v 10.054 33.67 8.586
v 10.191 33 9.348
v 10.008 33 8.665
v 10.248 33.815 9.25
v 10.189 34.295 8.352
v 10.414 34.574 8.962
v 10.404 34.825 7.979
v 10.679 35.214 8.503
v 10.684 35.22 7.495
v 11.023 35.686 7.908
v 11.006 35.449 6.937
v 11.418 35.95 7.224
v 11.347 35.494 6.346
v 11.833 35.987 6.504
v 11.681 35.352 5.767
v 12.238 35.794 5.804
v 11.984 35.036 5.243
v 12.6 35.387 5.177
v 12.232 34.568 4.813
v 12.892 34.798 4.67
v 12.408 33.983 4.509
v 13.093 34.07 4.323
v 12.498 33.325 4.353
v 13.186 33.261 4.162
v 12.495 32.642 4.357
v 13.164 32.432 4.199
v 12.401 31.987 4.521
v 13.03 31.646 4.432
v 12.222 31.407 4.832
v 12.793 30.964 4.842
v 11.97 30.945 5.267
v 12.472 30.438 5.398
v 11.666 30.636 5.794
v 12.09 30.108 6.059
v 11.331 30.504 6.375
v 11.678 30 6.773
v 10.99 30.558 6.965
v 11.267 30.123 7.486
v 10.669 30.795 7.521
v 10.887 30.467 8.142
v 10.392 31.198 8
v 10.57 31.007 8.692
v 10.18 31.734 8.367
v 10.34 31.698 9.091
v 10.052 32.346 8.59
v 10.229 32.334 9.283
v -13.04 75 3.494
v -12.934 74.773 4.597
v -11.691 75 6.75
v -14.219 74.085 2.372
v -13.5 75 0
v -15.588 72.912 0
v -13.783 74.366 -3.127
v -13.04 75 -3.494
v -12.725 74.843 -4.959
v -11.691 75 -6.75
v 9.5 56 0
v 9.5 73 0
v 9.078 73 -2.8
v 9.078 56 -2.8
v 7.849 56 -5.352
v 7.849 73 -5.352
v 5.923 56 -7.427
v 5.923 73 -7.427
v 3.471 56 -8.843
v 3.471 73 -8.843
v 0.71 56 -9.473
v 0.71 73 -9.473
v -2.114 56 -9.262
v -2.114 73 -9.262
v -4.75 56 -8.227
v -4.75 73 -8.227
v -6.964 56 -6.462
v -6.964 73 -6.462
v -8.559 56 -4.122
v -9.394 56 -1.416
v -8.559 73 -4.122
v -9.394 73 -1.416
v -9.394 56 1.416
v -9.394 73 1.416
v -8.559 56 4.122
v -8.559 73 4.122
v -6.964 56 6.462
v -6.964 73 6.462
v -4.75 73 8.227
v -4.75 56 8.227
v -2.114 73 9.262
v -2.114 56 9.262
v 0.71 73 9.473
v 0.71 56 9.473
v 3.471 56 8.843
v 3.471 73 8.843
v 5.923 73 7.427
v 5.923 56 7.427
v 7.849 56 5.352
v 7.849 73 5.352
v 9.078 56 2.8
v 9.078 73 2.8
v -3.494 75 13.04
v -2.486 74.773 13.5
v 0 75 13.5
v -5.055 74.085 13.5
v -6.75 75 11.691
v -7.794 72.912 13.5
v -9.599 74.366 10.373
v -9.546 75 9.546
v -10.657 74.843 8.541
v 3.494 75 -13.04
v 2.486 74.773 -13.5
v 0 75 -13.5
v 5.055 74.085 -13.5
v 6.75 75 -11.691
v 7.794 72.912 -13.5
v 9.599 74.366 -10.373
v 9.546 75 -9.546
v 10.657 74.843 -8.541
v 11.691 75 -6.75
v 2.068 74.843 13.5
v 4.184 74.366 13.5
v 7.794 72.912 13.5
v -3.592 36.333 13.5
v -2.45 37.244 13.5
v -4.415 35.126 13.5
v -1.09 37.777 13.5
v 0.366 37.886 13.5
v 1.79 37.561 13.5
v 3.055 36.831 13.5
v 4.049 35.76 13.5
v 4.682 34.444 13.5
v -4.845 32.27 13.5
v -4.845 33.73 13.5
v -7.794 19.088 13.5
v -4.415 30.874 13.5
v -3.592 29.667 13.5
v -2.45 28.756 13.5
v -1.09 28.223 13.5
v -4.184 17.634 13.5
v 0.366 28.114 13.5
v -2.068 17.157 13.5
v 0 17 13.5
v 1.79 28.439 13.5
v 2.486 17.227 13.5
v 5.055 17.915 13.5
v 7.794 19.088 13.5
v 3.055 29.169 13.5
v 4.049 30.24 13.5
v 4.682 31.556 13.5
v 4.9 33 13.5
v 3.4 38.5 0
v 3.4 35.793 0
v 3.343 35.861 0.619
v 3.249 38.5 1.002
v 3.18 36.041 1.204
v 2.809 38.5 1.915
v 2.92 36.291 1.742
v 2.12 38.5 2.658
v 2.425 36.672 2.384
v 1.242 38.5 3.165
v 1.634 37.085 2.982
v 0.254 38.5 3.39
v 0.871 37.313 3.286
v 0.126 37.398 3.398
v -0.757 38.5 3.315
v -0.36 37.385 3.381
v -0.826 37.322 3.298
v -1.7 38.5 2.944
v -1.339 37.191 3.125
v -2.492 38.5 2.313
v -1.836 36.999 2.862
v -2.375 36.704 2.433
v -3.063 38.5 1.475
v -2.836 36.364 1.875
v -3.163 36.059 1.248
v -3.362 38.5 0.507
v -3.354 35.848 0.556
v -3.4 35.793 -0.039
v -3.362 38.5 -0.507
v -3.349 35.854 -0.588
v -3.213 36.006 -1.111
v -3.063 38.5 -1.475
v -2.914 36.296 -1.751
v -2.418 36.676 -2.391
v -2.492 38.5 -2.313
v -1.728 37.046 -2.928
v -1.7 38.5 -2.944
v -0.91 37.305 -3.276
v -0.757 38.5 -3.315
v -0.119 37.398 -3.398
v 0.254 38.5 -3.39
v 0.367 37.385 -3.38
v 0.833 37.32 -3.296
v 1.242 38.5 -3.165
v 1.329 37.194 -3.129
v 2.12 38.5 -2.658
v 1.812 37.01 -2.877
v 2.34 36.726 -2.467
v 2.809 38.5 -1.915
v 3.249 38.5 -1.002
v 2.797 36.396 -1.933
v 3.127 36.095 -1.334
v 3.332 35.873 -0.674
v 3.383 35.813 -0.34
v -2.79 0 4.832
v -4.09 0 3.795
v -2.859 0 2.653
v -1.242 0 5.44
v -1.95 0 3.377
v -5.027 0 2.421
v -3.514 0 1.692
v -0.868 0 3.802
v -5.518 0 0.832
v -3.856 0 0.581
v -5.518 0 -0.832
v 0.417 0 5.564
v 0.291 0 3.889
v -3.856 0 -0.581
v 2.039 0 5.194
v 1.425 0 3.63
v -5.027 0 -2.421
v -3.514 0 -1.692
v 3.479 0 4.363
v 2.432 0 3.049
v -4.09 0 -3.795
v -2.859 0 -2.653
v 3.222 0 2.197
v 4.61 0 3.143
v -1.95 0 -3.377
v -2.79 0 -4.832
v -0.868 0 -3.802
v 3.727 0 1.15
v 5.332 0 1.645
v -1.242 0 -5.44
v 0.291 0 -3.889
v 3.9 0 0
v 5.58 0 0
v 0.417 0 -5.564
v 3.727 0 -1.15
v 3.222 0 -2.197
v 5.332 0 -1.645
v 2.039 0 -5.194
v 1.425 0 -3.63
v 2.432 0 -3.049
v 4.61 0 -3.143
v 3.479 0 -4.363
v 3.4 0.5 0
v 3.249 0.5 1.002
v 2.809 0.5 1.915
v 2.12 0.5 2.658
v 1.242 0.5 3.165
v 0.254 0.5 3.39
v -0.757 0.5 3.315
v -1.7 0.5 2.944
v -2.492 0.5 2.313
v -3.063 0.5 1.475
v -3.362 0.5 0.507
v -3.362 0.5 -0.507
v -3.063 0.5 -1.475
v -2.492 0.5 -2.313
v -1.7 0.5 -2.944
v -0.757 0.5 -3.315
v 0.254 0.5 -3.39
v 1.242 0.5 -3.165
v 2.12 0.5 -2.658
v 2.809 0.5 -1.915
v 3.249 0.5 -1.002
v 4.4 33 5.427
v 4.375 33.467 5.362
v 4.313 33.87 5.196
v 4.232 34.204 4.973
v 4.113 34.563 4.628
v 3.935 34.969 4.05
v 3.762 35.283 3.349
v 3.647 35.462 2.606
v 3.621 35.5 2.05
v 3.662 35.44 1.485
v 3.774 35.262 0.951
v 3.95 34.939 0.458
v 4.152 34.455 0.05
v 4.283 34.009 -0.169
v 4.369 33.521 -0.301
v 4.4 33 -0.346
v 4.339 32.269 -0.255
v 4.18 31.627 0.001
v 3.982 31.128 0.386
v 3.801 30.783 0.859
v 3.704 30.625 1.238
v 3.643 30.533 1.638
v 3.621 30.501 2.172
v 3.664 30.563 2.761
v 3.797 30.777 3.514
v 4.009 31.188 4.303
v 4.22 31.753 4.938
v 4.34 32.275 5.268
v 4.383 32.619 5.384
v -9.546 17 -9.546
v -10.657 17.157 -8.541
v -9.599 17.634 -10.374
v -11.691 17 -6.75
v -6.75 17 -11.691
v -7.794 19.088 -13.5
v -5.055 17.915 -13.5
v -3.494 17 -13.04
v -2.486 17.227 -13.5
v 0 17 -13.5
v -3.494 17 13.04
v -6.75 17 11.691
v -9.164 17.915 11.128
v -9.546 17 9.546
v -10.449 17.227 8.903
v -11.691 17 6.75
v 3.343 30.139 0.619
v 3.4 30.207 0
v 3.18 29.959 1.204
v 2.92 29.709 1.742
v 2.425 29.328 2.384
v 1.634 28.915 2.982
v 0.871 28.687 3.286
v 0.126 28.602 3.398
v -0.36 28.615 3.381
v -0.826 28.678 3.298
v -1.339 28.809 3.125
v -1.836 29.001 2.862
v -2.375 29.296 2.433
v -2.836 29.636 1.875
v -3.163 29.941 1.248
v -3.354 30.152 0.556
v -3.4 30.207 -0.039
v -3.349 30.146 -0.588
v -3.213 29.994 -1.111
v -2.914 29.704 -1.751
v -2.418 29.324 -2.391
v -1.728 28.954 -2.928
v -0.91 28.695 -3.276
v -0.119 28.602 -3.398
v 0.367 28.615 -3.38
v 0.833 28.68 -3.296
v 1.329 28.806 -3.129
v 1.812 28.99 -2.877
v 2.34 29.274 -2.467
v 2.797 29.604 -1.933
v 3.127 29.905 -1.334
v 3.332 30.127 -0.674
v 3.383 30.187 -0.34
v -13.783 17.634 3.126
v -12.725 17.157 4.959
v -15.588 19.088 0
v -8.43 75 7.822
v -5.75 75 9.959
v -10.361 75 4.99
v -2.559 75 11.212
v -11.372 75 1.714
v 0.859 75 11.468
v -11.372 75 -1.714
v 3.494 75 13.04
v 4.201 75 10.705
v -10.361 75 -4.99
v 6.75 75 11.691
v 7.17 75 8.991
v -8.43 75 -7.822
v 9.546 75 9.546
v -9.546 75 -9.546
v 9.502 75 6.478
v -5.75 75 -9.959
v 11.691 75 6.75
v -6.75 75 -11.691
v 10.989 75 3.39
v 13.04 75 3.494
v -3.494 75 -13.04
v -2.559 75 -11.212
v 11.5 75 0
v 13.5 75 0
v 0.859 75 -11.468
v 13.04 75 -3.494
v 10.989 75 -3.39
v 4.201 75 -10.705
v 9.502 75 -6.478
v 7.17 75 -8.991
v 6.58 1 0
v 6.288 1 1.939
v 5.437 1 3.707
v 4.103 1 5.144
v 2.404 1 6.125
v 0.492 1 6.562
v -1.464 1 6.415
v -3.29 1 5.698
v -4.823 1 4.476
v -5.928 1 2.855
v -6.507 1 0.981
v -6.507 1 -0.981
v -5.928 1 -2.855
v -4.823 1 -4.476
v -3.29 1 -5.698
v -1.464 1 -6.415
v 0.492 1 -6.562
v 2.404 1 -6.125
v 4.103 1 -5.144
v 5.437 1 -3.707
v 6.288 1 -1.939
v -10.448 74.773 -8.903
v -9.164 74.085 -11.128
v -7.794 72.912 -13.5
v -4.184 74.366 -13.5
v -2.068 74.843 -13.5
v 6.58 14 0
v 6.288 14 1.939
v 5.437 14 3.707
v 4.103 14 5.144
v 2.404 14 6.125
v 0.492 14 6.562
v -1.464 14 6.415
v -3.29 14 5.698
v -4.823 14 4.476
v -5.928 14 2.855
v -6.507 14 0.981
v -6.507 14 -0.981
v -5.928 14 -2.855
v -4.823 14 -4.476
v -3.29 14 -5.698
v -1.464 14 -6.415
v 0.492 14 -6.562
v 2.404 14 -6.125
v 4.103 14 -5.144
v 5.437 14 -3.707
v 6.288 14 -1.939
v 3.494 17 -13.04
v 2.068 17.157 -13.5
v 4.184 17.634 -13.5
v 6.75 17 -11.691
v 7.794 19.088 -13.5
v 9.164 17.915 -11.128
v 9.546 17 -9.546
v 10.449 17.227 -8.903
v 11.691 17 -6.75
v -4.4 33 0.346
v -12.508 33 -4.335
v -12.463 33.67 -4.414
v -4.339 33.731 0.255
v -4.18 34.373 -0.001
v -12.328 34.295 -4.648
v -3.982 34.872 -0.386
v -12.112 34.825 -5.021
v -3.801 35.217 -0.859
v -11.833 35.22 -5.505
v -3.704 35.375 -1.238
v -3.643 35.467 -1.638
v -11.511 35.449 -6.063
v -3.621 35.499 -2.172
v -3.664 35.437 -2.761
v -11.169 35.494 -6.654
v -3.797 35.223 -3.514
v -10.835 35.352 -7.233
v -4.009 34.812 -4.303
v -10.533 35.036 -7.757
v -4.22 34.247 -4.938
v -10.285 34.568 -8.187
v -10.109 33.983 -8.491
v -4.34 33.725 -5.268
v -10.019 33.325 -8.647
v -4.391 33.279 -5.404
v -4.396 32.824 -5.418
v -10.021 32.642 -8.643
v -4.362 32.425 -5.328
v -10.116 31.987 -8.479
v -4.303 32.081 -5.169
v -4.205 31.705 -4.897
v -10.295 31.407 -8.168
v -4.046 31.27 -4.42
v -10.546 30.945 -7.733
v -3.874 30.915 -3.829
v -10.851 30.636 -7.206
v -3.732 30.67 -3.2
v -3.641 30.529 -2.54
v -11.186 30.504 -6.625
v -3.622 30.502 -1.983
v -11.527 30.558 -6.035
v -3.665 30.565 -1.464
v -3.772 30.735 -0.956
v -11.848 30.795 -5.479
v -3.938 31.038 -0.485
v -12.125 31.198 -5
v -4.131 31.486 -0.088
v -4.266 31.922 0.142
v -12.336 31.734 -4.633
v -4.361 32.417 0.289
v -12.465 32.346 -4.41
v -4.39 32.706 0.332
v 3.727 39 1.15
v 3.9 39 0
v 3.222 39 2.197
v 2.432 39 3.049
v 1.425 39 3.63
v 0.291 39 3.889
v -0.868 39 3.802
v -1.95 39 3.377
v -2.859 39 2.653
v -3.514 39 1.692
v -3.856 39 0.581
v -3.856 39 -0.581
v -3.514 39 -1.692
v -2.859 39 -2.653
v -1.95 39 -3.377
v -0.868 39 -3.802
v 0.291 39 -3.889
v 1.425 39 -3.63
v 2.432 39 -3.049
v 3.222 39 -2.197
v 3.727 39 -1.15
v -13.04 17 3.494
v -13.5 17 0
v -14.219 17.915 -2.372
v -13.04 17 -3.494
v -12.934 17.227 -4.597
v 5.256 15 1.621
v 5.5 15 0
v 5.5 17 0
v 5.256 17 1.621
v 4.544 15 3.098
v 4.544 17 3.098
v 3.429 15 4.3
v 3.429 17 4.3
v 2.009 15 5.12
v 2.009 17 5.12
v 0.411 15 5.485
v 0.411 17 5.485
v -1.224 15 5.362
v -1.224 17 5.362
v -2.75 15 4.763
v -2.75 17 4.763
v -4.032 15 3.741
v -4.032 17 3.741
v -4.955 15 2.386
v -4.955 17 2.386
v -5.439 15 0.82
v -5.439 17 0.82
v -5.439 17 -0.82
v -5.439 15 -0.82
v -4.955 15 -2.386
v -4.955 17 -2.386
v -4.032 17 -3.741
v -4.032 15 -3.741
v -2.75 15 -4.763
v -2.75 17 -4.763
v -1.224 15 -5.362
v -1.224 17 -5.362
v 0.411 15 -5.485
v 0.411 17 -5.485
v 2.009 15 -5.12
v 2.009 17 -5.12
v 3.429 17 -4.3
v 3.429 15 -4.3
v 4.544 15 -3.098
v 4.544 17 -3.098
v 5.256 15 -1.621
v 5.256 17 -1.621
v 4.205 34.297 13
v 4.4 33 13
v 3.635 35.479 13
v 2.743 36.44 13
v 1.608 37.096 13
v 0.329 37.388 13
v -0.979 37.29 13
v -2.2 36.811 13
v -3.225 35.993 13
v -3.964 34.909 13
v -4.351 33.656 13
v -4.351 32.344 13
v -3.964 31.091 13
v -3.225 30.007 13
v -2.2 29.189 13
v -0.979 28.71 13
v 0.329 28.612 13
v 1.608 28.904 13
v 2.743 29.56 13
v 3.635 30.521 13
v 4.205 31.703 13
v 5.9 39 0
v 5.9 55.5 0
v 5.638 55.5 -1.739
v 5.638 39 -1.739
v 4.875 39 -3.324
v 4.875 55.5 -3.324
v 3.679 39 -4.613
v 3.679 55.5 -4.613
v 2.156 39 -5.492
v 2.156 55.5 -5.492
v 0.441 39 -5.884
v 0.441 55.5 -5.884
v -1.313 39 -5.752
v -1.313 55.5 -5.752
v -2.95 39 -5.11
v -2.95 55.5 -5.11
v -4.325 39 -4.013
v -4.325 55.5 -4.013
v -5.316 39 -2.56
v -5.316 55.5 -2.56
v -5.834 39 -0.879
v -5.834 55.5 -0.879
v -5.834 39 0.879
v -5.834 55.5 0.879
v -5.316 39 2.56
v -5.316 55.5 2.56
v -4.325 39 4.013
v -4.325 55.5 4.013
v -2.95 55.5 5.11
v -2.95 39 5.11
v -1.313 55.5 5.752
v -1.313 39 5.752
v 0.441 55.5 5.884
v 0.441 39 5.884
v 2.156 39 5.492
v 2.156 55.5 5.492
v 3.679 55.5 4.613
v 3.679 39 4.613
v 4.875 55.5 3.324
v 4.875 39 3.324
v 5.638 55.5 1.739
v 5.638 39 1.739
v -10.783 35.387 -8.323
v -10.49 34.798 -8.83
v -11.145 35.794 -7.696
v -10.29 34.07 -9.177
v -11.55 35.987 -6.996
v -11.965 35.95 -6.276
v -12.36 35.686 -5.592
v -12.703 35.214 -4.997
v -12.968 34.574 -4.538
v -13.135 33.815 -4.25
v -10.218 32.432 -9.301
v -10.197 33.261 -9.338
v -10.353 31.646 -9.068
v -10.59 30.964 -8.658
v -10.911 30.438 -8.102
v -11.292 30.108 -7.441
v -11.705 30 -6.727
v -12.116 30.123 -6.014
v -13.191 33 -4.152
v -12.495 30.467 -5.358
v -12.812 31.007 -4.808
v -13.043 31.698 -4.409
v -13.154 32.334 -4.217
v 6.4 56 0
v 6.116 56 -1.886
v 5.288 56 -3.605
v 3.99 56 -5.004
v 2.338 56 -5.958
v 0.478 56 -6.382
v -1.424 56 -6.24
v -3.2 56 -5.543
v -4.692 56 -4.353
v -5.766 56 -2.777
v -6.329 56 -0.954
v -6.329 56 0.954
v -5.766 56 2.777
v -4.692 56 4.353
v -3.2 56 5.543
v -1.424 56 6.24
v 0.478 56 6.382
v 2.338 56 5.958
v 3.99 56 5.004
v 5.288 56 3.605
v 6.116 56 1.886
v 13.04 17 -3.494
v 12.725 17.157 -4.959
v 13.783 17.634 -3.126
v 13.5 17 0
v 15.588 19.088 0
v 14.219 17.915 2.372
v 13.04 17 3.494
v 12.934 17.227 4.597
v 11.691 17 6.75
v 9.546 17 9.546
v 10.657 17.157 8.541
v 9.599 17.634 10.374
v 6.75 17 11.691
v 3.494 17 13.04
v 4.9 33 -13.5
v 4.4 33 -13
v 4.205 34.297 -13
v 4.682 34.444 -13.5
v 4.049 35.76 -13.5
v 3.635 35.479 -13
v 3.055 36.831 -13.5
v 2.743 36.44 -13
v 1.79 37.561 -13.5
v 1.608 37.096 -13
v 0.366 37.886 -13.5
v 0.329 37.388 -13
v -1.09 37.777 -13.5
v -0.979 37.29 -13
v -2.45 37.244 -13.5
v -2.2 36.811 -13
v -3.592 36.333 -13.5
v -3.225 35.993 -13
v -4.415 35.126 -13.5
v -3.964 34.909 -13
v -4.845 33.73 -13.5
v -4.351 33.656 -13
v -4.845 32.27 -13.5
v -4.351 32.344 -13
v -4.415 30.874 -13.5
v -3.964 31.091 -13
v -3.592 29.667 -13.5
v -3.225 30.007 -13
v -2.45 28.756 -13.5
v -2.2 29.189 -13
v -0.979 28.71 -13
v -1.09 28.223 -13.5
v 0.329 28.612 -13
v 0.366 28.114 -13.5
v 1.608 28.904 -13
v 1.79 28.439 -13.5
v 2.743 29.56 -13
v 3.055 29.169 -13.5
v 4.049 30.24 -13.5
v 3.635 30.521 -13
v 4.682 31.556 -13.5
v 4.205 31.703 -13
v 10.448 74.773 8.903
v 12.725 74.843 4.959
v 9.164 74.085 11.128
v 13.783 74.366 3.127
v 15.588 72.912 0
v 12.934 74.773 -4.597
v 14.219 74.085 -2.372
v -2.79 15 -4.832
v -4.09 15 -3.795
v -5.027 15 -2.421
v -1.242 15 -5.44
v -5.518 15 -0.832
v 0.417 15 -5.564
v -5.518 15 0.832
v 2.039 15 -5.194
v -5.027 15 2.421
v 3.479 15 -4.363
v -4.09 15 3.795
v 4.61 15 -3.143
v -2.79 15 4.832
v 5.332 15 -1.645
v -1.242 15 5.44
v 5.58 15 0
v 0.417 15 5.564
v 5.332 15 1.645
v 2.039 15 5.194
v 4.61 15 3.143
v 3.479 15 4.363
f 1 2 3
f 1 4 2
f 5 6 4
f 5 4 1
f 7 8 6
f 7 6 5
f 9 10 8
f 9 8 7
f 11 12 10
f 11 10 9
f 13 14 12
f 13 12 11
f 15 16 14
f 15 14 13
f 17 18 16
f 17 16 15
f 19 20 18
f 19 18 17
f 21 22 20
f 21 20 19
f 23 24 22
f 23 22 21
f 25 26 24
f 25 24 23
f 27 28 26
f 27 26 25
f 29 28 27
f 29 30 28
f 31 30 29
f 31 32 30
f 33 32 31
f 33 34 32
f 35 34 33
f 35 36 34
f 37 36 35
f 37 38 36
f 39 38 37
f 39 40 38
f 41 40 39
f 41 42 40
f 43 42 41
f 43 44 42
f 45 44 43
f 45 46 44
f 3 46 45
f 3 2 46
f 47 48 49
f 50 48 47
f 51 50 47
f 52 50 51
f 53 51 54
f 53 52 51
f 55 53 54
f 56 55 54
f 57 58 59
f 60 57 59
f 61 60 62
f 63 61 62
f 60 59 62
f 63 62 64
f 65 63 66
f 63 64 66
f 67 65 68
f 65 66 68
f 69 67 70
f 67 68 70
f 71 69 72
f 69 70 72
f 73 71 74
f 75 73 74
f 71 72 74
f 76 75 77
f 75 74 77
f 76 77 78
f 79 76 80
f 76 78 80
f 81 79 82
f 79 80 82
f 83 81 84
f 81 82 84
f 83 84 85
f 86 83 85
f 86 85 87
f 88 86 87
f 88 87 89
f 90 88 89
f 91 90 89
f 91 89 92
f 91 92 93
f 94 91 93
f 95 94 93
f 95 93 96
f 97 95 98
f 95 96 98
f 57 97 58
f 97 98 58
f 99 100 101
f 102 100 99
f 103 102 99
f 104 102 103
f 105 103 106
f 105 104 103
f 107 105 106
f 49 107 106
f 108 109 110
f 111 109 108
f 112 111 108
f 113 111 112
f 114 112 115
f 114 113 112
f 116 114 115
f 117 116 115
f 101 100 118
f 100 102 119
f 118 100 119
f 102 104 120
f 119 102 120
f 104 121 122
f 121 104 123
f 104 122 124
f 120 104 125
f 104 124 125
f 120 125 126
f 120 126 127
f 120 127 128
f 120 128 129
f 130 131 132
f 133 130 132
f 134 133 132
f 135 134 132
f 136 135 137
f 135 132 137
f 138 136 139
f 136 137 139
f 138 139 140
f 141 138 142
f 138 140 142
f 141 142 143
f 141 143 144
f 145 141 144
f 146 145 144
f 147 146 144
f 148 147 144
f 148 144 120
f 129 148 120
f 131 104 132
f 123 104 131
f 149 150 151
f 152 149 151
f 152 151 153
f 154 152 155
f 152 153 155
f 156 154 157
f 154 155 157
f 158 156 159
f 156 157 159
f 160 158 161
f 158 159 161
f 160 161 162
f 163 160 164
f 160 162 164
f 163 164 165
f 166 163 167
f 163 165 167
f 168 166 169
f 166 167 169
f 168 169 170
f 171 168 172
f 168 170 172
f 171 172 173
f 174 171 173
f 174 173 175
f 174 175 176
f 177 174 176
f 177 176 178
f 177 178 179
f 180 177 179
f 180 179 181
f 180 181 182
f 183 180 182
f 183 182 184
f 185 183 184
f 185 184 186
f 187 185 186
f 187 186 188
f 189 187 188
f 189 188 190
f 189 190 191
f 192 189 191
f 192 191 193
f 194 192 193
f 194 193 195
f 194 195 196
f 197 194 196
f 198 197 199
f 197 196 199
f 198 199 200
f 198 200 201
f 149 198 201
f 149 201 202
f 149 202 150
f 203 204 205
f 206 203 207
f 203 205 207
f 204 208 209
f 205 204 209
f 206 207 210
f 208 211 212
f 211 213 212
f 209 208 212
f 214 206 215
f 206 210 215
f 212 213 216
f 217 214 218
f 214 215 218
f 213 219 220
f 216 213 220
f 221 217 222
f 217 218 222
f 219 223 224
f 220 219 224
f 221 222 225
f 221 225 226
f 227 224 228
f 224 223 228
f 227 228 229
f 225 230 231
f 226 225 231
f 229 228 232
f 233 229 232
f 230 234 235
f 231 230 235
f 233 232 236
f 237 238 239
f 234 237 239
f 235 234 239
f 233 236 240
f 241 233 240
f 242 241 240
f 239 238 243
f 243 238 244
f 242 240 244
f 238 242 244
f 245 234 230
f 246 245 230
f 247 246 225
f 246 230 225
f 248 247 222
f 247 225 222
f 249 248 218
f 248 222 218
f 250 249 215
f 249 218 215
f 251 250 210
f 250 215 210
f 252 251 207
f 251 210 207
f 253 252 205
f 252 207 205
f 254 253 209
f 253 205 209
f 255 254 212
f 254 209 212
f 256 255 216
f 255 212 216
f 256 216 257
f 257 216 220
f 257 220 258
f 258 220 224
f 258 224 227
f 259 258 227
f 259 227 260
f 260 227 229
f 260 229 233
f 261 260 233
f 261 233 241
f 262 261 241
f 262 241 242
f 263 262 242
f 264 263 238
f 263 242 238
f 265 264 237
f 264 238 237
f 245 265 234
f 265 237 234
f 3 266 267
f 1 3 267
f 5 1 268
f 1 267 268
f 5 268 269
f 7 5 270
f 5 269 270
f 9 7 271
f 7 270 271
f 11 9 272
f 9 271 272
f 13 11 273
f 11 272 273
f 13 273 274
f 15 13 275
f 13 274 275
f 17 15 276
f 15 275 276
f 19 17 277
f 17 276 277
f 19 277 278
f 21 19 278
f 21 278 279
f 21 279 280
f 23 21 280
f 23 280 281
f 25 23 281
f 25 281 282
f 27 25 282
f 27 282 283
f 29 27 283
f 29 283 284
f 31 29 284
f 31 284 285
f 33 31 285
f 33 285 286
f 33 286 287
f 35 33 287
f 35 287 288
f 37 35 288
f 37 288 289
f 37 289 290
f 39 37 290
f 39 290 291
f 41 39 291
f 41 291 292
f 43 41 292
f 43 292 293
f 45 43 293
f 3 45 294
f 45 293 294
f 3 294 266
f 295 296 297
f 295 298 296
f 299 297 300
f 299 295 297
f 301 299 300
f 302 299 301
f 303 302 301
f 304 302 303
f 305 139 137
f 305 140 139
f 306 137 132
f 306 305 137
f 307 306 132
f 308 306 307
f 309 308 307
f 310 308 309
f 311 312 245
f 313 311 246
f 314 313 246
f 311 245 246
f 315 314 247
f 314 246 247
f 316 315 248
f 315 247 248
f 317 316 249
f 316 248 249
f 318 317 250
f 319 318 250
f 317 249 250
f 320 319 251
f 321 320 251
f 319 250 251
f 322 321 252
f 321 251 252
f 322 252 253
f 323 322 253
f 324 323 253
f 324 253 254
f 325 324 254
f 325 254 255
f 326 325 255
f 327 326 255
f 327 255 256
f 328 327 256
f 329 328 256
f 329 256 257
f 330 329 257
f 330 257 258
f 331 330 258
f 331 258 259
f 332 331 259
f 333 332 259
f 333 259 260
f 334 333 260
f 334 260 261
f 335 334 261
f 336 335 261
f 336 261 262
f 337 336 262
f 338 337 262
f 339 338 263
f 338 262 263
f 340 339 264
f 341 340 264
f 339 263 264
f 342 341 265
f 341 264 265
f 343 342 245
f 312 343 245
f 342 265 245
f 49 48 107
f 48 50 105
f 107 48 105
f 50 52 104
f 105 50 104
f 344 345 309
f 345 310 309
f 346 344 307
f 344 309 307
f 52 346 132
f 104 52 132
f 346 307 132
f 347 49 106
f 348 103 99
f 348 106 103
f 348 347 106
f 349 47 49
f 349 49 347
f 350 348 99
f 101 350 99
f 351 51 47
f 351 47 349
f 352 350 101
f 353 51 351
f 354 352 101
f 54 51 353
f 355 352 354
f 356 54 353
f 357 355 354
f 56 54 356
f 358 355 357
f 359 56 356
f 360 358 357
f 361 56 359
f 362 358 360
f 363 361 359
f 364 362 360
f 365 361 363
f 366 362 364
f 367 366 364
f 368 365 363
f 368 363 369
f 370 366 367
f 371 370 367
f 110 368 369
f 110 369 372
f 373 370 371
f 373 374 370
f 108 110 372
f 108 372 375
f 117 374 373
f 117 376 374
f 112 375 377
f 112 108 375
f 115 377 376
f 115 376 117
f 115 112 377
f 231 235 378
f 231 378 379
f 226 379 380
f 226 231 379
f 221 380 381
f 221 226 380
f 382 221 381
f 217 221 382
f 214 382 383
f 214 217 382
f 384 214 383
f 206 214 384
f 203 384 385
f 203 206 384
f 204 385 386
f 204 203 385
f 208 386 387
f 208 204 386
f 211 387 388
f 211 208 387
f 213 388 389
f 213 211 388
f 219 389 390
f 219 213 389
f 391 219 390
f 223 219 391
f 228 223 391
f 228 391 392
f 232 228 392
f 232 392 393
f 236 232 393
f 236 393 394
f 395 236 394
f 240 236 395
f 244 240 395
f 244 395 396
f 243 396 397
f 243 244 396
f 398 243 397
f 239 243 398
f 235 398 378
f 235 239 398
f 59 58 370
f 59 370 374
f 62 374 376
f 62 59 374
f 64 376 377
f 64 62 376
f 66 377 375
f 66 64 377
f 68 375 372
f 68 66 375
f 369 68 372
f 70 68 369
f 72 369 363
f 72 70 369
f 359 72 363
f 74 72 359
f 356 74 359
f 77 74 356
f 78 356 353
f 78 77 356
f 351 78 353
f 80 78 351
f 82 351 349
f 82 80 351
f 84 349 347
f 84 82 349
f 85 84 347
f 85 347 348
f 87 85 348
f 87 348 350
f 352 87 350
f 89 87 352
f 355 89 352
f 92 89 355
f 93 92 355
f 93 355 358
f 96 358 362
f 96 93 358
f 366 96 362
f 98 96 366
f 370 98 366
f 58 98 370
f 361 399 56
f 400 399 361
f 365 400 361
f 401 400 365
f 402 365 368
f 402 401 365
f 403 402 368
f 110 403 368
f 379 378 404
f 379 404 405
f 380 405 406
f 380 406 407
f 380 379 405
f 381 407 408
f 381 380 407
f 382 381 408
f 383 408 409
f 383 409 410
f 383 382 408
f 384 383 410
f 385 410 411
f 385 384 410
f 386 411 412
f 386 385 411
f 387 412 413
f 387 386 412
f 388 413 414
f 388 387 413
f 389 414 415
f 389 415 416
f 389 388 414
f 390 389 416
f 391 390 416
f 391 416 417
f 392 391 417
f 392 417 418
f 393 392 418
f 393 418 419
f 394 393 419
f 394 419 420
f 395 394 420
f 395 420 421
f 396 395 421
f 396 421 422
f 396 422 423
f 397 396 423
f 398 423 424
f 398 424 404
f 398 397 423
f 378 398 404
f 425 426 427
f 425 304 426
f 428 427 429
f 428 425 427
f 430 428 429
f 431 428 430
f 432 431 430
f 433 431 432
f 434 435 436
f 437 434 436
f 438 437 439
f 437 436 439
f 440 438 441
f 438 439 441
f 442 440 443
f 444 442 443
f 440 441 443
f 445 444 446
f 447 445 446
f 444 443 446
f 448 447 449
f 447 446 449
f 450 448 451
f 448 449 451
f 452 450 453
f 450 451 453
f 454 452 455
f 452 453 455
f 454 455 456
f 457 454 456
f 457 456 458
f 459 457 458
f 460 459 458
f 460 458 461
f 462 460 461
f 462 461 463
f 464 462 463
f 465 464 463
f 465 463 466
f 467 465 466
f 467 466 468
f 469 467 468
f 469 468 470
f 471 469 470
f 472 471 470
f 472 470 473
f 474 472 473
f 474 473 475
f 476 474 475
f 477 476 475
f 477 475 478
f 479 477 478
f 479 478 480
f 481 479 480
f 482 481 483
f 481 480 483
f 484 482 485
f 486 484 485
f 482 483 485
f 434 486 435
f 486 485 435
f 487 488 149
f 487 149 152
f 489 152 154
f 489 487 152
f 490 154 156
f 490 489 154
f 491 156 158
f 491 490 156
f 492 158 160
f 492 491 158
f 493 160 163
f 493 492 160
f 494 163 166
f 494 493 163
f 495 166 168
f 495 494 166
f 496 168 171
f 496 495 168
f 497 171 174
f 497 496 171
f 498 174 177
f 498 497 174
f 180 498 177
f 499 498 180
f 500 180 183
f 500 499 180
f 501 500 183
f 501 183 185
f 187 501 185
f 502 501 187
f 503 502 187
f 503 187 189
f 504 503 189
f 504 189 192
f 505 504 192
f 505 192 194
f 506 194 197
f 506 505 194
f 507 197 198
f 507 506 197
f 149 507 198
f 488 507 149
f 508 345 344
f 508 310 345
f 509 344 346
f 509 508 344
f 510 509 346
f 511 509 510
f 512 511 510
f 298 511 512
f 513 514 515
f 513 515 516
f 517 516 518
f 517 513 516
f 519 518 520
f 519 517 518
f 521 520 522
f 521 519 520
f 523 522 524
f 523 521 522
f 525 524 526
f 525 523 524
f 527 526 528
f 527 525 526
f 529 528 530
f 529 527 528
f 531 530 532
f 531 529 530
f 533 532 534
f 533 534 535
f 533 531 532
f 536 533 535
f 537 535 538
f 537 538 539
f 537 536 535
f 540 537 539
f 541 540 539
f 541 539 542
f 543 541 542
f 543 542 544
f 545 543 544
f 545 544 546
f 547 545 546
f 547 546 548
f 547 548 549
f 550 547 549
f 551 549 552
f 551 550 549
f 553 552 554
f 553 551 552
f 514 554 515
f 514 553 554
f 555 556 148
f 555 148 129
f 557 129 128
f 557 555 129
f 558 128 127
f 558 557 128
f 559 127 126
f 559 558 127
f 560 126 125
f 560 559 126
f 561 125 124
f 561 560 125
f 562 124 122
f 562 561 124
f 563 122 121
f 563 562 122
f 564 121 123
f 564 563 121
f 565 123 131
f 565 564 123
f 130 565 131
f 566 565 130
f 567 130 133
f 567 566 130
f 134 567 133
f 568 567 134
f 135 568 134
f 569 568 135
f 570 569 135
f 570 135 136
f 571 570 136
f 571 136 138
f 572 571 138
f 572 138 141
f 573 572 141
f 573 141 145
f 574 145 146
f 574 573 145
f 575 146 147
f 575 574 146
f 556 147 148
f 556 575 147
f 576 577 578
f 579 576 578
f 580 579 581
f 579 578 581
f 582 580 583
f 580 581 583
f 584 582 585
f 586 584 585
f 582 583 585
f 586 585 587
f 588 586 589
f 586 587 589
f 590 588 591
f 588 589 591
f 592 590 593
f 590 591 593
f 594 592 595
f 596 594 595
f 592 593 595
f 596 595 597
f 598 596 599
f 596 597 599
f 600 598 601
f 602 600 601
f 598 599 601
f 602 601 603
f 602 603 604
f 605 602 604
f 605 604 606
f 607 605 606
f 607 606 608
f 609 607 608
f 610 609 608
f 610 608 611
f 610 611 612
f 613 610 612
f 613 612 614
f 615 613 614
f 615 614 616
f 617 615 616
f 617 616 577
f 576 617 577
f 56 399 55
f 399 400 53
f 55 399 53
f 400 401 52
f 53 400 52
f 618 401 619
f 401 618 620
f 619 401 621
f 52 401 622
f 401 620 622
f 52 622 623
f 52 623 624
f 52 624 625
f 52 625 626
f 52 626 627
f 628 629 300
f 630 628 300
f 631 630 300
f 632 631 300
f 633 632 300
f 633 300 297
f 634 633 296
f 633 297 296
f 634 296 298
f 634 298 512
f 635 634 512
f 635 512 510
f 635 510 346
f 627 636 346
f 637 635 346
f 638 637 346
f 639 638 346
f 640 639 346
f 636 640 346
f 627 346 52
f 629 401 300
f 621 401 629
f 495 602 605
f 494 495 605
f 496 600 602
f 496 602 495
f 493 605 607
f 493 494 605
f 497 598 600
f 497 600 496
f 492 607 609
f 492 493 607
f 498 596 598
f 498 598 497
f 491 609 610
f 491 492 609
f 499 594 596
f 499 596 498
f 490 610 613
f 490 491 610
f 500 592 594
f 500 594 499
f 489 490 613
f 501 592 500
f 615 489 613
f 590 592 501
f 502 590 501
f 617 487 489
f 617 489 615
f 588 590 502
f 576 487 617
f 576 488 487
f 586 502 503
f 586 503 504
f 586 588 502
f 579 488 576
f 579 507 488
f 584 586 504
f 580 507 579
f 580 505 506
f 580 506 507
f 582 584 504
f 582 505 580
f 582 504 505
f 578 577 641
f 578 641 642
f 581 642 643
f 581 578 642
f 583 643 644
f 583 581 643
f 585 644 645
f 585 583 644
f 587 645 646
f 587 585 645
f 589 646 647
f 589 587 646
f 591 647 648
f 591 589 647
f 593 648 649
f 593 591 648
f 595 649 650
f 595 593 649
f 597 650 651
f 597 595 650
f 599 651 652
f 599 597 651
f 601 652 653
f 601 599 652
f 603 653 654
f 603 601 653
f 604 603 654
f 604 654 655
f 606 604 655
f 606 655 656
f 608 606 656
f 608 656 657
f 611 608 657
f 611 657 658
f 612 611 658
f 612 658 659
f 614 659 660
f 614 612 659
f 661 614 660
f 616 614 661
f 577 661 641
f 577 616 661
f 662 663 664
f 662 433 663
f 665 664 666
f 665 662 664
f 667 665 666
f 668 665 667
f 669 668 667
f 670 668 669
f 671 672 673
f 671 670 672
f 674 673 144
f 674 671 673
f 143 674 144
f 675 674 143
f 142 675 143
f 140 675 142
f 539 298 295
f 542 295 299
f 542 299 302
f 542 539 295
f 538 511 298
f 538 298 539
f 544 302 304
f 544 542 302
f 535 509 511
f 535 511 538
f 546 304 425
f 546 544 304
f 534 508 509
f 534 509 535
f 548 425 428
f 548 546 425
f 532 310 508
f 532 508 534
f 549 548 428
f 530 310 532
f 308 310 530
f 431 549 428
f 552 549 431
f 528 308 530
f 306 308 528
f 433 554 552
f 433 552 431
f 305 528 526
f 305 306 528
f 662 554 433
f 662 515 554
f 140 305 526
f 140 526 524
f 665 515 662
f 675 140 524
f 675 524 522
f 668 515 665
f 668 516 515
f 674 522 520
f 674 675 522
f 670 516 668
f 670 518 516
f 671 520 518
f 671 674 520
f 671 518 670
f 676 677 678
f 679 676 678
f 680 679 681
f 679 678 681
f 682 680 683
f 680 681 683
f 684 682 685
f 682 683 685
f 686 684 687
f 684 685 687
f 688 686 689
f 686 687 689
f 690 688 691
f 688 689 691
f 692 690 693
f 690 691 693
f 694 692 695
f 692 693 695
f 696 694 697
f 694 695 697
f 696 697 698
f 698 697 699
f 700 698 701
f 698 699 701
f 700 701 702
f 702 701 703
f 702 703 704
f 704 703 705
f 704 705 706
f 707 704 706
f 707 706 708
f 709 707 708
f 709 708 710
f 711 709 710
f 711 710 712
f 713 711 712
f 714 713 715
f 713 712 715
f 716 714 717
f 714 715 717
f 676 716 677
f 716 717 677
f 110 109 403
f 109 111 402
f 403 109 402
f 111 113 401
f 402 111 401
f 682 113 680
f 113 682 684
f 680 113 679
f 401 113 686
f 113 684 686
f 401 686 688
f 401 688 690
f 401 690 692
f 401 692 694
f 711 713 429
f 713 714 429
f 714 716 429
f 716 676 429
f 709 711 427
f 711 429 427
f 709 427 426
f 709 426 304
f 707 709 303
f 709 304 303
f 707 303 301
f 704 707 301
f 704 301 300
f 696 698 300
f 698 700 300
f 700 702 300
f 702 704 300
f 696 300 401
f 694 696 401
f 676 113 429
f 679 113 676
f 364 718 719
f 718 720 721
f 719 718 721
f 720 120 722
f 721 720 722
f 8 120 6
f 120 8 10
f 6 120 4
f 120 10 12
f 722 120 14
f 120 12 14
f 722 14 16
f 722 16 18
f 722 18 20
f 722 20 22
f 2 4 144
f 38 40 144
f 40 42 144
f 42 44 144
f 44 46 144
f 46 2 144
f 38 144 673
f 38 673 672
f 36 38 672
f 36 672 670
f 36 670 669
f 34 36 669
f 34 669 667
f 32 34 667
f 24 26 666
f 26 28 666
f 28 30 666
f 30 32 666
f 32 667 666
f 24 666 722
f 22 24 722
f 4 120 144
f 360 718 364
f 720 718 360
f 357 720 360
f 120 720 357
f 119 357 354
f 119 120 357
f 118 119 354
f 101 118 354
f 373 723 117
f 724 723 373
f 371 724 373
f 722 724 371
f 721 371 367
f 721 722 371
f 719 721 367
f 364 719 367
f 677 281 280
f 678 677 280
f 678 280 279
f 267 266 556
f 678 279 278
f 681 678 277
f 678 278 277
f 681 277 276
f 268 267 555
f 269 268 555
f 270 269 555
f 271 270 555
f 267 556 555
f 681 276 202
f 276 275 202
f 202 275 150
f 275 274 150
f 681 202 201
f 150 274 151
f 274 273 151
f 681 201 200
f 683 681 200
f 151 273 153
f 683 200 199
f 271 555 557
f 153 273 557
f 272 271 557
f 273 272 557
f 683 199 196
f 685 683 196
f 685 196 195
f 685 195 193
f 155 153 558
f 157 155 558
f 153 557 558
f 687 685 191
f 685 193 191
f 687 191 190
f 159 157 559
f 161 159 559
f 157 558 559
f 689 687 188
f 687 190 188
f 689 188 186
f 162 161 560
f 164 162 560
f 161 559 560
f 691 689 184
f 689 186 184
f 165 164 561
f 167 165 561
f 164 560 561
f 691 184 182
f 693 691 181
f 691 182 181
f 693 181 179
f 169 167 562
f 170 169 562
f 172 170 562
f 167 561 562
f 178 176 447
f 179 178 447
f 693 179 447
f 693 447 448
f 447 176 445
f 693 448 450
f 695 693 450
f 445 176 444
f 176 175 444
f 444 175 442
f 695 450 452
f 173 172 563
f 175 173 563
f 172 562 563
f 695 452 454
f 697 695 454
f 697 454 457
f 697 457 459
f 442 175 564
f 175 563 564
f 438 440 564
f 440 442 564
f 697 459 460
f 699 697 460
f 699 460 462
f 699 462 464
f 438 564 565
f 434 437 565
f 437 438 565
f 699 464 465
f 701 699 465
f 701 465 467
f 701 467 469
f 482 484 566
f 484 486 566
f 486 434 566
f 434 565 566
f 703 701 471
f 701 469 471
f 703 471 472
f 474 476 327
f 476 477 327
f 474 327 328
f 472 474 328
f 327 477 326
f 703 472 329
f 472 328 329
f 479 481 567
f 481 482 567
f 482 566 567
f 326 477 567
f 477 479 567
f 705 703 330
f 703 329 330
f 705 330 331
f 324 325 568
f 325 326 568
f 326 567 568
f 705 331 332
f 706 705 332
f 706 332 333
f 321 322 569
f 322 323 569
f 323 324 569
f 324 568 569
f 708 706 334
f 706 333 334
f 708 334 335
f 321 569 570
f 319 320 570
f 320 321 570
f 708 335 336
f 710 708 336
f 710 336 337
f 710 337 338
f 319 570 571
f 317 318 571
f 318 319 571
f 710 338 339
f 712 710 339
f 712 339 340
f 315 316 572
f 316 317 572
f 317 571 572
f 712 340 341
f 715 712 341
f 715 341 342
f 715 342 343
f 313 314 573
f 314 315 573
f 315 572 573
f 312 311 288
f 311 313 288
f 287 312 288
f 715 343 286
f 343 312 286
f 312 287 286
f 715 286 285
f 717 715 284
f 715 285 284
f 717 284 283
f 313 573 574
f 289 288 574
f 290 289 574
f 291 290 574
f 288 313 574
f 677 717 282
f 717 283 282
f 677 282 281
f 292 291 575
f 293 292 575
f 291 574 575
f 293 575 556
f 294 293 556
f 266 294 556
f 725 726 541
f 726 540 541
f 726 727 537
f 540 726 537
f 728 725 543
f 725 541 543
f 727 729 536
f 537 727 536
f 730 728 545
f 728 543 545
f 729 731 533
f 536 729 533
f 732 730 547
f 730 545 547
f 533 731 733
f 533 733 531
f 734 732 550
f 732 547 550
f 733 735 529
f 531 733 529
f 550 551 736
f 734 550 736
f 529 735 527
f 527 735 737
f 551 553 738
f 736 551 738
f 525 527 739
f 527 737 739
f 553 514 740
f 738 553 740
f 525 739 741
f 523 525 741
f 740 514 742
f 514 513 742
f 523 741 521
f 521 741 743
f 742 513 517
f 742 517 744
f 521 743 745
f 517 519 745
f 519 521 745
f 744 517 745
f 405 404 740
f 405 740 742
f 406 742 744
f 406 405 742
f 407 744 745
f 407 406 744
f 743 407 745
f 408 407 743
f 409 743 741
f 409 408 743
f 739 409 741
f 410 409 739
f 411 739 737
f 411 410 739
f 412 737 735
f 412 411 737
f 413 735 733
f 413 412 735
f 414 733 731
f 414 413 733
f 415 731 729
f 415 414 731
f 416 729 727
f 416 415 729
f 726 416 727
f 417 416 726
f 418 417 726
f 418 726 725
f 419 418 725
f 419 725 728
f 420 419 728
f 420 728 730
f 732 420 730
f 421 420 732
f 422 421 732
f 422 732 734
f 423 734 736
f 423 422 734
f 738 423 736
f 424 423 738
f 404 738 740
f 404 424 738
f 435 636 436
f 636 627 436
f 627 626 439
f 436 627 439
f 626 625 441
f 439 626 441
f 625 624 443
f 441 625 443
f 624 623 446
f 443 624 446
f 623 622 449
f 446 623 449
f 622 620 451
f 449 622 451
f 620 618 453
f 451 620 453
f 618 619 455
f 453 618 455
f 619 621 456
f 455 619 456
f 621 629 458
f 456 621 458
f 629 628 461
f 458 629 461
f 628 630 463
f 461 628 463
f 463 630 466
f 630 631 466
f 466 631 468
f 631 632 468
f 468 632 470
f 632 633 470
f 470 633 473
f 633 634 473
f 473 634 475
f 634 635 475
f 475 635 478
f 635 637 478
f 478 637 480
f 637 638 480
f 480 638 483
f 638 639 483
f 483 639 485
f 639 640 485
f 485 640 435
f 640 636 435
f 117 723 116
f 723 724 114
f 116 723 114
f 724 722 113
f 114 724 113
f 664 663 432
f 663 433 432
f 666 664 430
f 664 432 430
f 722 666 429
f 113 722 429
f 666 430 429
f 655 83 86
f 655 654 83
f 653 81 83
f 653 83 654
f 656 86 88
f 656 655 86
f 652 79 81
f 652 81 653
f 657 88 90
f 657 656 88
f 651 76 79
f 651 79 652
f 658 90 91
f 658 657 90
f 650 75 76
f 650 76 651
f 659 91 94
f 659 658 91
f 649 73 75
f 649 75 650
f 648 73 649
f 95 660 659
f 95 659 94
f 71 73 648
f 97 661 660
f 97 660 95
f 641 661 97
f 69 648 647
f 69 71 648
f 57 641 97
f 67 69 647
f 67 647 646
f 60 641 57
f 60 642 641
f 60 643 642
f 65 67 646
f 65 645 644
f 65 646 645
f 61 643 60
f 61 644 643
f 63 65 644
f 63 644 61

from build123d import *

# Parameters (mm, degrees)
BOSS_EXTRUDE1_DEPTH = 75
SKETCH2_R           = 6.58
CUT_EXTRUDE1_DEPTH  = 15
SKETCH3_OUTSIDE_W   = 50.294
SKETCH3_OUTSIDE_H   = 46.118
SKETCH3_OUTSIDE_R   = 5.5
CUT_EXTRUDE3_DEPTH  = 2
SKETCH4_R           = 3.4
CUT_EXTRUDE4_DEPTH  = 76
SKETCH5_R           = 5.9
CUT_EXTRUDE5_DEPTH  = 36
SKETCH7_R           = 9.5
CUT_EXTRUDE7_DEPTH  = 19
SKETCH8_R           = 4.4
CUT_EXTRUDE8_DEPTH  = 28
SKETCH9_R           = 2.5
CUT_EXTRUDE9_DEPTH  = 34.75000005
CHAMFER2_SIZE       = 0.5
CHAMFER3_SIZE       = 2
CHAMFER4_SIZE       = 1


with BuildPart() as part:
    # Sketch1 → Boss-Extrude1 (new body)
    with BuildSketch(Plane(origin=(0, 0, 0), x_dir=(1, 0, 0), z_dir=(0, 1, 0))):
        Polygon((7.794228634, -13.5), (15.588457268, 0), (7.794228634, 13.5), (-7.794228634, 13.5), (-15.588457268, 0), (-7.794228634, -13.5), align=None)
    extrude(amount=BOSS_EXTRUDE1_DEPTH)

    # Sketch2 → Cut-Extrude1 (cut)
    with BuildSketch(Plane.XZ):
        Polygon((15.588457268, 0), (7.794228634, 13.5), (-7.794228634, 13.5), (-15.588457268, 0), (-7.794228634, -13.5), (7.794228634, -13.5), align=None)
        Circle(SKETCH2_R, mode=Mode.SUBTRACT)
    extrude(amount=-CUT_EXTRUDE1_DEPTH, mode=Mode.SUBTRACT)

    # Sketch3 outside → Cut-Extrude3 (cut)
    with BuildSketch(Plane.XZ.offset(-15)):
        Rectangle(SKETCH3_OUTSIDE_W, SKETCH3_OUTSIDE_H)
        Circle(SKETCH3_OUTSIDE_R, mode=Mode.SUBTRACT)
    extrude(amount=-CUT_EXTRUDE3_DEPTH, mode=Mode.SUBTRACT)

    # Sketch4 → Cut-Extrude4 (cut, through all)
    with BuildSketch(Plane.XZ):
        Circle(SKETCH4_R)
    extrude(amount=-CUT_EXTRUDE4_DEPTH, mode=Mode.SUBTRACT)

    # Sketch5 → Cut-Extrude5 (cut)
    with BuildSketch(Plane(origin=(0, 75, 0), x_dir=(1, 0, 0), z_dir=(0, 1, 0))):
        Circle(SKETCH5_R)
    extrude(amount=-CUT_EXTRUDE5_DEPTH, mode=Mode.SUBTRACT)

    # Sketch7 → Cut-Extrude7 (cut)
    with BuildSketch(Plane(origin=(0, 75, 0), x_dir=(1, 0, 0), z_dir=(0, 1, 0))):
        Circle(SKETCH7_R)
    extrude(amount=-CUT_EXTRUDE7_DEPTH, mode=Mode.SUBTRACT)

    # Sketch8 → Cut-Extrude8 (cut, through all)
    with BuildSketch(Plane.XY.offset(13.5)):
        with Locations((0, 33)):
            Circle(SKETCH8_R)
    extrude(amount=-CUT_EXTRUDE8_DEPTH, mode=Mode.SUBTRACT)

    # Sketch9 → Cut-Extrude9 (cut, through all)
    with BuildSketch(Plane(origin=(-11.691342951, 0, -6.75), x_dir=(-0.5, 0, 0.866025404), z_dir=(-0.866025404, 0, -0.5))):
        with Locations((0, 33)):
            Circle(SKETCH9_R)
    extrude(amount=-CUT_EXTRUDE9_DEPTH, mode=Mode.SUBTRACT)

    # Sketch10 → Cut-Revolve1 (revolve, cut)
    with BuildSketch(Plane(origin=(0, 0, 0), x_dir=(0, 0, -1), z_dir=(1, 0, 0))):
        Polygon((8.51850403, 79.98149597), (18.48149597, 70.01850403), (18.48149597, 79.98149597), align=None)
        Polygon((16.279129623, 19.779129623), (10.720870377, 14.220870377), (16.279129623, 14.220870377), align=None)
    revolve(axis=Axis((0, 77.98149597, 0), (0, -1, 0)), mode=Mode.SUBTRACT)

    # Chamfer2
    chamfer2_edges = [part.edges().sort_by_distance(p)[0] for p in [
        (-10.441342951, 33, -8.915063509),
        (-3.4, 0, 0),
        (-3.4, 39, 0),
        (-5.9, 56, 0),
        (-4.4, 33, -13.5),
        (-4.4, 33, 13.5),
        (12.941342951, 33, 4.584936491),
    ]]
    chamfer(chamfer2_edges, length=CHAMFER2_SIZE)

    # Chamfer3
    chamfer3_edges = [part.edges().sort_by_distance(p)[0] for p in [
        (-9.5, 75, 0),
    ]]
    chamfer(chamfer3_edges, length=CHAMFER3_SIZE)

    # Chamfer4
    chamfer4_edges = [part.edges().sort_by_distance(p)[0] for p in [
        (-6.58, 0, 0),
        (-6.58, 15, 0),
    ]]
    chamfer(chamfer4_edges, length=CHAMFER4_SIZE)


solid = part.part
